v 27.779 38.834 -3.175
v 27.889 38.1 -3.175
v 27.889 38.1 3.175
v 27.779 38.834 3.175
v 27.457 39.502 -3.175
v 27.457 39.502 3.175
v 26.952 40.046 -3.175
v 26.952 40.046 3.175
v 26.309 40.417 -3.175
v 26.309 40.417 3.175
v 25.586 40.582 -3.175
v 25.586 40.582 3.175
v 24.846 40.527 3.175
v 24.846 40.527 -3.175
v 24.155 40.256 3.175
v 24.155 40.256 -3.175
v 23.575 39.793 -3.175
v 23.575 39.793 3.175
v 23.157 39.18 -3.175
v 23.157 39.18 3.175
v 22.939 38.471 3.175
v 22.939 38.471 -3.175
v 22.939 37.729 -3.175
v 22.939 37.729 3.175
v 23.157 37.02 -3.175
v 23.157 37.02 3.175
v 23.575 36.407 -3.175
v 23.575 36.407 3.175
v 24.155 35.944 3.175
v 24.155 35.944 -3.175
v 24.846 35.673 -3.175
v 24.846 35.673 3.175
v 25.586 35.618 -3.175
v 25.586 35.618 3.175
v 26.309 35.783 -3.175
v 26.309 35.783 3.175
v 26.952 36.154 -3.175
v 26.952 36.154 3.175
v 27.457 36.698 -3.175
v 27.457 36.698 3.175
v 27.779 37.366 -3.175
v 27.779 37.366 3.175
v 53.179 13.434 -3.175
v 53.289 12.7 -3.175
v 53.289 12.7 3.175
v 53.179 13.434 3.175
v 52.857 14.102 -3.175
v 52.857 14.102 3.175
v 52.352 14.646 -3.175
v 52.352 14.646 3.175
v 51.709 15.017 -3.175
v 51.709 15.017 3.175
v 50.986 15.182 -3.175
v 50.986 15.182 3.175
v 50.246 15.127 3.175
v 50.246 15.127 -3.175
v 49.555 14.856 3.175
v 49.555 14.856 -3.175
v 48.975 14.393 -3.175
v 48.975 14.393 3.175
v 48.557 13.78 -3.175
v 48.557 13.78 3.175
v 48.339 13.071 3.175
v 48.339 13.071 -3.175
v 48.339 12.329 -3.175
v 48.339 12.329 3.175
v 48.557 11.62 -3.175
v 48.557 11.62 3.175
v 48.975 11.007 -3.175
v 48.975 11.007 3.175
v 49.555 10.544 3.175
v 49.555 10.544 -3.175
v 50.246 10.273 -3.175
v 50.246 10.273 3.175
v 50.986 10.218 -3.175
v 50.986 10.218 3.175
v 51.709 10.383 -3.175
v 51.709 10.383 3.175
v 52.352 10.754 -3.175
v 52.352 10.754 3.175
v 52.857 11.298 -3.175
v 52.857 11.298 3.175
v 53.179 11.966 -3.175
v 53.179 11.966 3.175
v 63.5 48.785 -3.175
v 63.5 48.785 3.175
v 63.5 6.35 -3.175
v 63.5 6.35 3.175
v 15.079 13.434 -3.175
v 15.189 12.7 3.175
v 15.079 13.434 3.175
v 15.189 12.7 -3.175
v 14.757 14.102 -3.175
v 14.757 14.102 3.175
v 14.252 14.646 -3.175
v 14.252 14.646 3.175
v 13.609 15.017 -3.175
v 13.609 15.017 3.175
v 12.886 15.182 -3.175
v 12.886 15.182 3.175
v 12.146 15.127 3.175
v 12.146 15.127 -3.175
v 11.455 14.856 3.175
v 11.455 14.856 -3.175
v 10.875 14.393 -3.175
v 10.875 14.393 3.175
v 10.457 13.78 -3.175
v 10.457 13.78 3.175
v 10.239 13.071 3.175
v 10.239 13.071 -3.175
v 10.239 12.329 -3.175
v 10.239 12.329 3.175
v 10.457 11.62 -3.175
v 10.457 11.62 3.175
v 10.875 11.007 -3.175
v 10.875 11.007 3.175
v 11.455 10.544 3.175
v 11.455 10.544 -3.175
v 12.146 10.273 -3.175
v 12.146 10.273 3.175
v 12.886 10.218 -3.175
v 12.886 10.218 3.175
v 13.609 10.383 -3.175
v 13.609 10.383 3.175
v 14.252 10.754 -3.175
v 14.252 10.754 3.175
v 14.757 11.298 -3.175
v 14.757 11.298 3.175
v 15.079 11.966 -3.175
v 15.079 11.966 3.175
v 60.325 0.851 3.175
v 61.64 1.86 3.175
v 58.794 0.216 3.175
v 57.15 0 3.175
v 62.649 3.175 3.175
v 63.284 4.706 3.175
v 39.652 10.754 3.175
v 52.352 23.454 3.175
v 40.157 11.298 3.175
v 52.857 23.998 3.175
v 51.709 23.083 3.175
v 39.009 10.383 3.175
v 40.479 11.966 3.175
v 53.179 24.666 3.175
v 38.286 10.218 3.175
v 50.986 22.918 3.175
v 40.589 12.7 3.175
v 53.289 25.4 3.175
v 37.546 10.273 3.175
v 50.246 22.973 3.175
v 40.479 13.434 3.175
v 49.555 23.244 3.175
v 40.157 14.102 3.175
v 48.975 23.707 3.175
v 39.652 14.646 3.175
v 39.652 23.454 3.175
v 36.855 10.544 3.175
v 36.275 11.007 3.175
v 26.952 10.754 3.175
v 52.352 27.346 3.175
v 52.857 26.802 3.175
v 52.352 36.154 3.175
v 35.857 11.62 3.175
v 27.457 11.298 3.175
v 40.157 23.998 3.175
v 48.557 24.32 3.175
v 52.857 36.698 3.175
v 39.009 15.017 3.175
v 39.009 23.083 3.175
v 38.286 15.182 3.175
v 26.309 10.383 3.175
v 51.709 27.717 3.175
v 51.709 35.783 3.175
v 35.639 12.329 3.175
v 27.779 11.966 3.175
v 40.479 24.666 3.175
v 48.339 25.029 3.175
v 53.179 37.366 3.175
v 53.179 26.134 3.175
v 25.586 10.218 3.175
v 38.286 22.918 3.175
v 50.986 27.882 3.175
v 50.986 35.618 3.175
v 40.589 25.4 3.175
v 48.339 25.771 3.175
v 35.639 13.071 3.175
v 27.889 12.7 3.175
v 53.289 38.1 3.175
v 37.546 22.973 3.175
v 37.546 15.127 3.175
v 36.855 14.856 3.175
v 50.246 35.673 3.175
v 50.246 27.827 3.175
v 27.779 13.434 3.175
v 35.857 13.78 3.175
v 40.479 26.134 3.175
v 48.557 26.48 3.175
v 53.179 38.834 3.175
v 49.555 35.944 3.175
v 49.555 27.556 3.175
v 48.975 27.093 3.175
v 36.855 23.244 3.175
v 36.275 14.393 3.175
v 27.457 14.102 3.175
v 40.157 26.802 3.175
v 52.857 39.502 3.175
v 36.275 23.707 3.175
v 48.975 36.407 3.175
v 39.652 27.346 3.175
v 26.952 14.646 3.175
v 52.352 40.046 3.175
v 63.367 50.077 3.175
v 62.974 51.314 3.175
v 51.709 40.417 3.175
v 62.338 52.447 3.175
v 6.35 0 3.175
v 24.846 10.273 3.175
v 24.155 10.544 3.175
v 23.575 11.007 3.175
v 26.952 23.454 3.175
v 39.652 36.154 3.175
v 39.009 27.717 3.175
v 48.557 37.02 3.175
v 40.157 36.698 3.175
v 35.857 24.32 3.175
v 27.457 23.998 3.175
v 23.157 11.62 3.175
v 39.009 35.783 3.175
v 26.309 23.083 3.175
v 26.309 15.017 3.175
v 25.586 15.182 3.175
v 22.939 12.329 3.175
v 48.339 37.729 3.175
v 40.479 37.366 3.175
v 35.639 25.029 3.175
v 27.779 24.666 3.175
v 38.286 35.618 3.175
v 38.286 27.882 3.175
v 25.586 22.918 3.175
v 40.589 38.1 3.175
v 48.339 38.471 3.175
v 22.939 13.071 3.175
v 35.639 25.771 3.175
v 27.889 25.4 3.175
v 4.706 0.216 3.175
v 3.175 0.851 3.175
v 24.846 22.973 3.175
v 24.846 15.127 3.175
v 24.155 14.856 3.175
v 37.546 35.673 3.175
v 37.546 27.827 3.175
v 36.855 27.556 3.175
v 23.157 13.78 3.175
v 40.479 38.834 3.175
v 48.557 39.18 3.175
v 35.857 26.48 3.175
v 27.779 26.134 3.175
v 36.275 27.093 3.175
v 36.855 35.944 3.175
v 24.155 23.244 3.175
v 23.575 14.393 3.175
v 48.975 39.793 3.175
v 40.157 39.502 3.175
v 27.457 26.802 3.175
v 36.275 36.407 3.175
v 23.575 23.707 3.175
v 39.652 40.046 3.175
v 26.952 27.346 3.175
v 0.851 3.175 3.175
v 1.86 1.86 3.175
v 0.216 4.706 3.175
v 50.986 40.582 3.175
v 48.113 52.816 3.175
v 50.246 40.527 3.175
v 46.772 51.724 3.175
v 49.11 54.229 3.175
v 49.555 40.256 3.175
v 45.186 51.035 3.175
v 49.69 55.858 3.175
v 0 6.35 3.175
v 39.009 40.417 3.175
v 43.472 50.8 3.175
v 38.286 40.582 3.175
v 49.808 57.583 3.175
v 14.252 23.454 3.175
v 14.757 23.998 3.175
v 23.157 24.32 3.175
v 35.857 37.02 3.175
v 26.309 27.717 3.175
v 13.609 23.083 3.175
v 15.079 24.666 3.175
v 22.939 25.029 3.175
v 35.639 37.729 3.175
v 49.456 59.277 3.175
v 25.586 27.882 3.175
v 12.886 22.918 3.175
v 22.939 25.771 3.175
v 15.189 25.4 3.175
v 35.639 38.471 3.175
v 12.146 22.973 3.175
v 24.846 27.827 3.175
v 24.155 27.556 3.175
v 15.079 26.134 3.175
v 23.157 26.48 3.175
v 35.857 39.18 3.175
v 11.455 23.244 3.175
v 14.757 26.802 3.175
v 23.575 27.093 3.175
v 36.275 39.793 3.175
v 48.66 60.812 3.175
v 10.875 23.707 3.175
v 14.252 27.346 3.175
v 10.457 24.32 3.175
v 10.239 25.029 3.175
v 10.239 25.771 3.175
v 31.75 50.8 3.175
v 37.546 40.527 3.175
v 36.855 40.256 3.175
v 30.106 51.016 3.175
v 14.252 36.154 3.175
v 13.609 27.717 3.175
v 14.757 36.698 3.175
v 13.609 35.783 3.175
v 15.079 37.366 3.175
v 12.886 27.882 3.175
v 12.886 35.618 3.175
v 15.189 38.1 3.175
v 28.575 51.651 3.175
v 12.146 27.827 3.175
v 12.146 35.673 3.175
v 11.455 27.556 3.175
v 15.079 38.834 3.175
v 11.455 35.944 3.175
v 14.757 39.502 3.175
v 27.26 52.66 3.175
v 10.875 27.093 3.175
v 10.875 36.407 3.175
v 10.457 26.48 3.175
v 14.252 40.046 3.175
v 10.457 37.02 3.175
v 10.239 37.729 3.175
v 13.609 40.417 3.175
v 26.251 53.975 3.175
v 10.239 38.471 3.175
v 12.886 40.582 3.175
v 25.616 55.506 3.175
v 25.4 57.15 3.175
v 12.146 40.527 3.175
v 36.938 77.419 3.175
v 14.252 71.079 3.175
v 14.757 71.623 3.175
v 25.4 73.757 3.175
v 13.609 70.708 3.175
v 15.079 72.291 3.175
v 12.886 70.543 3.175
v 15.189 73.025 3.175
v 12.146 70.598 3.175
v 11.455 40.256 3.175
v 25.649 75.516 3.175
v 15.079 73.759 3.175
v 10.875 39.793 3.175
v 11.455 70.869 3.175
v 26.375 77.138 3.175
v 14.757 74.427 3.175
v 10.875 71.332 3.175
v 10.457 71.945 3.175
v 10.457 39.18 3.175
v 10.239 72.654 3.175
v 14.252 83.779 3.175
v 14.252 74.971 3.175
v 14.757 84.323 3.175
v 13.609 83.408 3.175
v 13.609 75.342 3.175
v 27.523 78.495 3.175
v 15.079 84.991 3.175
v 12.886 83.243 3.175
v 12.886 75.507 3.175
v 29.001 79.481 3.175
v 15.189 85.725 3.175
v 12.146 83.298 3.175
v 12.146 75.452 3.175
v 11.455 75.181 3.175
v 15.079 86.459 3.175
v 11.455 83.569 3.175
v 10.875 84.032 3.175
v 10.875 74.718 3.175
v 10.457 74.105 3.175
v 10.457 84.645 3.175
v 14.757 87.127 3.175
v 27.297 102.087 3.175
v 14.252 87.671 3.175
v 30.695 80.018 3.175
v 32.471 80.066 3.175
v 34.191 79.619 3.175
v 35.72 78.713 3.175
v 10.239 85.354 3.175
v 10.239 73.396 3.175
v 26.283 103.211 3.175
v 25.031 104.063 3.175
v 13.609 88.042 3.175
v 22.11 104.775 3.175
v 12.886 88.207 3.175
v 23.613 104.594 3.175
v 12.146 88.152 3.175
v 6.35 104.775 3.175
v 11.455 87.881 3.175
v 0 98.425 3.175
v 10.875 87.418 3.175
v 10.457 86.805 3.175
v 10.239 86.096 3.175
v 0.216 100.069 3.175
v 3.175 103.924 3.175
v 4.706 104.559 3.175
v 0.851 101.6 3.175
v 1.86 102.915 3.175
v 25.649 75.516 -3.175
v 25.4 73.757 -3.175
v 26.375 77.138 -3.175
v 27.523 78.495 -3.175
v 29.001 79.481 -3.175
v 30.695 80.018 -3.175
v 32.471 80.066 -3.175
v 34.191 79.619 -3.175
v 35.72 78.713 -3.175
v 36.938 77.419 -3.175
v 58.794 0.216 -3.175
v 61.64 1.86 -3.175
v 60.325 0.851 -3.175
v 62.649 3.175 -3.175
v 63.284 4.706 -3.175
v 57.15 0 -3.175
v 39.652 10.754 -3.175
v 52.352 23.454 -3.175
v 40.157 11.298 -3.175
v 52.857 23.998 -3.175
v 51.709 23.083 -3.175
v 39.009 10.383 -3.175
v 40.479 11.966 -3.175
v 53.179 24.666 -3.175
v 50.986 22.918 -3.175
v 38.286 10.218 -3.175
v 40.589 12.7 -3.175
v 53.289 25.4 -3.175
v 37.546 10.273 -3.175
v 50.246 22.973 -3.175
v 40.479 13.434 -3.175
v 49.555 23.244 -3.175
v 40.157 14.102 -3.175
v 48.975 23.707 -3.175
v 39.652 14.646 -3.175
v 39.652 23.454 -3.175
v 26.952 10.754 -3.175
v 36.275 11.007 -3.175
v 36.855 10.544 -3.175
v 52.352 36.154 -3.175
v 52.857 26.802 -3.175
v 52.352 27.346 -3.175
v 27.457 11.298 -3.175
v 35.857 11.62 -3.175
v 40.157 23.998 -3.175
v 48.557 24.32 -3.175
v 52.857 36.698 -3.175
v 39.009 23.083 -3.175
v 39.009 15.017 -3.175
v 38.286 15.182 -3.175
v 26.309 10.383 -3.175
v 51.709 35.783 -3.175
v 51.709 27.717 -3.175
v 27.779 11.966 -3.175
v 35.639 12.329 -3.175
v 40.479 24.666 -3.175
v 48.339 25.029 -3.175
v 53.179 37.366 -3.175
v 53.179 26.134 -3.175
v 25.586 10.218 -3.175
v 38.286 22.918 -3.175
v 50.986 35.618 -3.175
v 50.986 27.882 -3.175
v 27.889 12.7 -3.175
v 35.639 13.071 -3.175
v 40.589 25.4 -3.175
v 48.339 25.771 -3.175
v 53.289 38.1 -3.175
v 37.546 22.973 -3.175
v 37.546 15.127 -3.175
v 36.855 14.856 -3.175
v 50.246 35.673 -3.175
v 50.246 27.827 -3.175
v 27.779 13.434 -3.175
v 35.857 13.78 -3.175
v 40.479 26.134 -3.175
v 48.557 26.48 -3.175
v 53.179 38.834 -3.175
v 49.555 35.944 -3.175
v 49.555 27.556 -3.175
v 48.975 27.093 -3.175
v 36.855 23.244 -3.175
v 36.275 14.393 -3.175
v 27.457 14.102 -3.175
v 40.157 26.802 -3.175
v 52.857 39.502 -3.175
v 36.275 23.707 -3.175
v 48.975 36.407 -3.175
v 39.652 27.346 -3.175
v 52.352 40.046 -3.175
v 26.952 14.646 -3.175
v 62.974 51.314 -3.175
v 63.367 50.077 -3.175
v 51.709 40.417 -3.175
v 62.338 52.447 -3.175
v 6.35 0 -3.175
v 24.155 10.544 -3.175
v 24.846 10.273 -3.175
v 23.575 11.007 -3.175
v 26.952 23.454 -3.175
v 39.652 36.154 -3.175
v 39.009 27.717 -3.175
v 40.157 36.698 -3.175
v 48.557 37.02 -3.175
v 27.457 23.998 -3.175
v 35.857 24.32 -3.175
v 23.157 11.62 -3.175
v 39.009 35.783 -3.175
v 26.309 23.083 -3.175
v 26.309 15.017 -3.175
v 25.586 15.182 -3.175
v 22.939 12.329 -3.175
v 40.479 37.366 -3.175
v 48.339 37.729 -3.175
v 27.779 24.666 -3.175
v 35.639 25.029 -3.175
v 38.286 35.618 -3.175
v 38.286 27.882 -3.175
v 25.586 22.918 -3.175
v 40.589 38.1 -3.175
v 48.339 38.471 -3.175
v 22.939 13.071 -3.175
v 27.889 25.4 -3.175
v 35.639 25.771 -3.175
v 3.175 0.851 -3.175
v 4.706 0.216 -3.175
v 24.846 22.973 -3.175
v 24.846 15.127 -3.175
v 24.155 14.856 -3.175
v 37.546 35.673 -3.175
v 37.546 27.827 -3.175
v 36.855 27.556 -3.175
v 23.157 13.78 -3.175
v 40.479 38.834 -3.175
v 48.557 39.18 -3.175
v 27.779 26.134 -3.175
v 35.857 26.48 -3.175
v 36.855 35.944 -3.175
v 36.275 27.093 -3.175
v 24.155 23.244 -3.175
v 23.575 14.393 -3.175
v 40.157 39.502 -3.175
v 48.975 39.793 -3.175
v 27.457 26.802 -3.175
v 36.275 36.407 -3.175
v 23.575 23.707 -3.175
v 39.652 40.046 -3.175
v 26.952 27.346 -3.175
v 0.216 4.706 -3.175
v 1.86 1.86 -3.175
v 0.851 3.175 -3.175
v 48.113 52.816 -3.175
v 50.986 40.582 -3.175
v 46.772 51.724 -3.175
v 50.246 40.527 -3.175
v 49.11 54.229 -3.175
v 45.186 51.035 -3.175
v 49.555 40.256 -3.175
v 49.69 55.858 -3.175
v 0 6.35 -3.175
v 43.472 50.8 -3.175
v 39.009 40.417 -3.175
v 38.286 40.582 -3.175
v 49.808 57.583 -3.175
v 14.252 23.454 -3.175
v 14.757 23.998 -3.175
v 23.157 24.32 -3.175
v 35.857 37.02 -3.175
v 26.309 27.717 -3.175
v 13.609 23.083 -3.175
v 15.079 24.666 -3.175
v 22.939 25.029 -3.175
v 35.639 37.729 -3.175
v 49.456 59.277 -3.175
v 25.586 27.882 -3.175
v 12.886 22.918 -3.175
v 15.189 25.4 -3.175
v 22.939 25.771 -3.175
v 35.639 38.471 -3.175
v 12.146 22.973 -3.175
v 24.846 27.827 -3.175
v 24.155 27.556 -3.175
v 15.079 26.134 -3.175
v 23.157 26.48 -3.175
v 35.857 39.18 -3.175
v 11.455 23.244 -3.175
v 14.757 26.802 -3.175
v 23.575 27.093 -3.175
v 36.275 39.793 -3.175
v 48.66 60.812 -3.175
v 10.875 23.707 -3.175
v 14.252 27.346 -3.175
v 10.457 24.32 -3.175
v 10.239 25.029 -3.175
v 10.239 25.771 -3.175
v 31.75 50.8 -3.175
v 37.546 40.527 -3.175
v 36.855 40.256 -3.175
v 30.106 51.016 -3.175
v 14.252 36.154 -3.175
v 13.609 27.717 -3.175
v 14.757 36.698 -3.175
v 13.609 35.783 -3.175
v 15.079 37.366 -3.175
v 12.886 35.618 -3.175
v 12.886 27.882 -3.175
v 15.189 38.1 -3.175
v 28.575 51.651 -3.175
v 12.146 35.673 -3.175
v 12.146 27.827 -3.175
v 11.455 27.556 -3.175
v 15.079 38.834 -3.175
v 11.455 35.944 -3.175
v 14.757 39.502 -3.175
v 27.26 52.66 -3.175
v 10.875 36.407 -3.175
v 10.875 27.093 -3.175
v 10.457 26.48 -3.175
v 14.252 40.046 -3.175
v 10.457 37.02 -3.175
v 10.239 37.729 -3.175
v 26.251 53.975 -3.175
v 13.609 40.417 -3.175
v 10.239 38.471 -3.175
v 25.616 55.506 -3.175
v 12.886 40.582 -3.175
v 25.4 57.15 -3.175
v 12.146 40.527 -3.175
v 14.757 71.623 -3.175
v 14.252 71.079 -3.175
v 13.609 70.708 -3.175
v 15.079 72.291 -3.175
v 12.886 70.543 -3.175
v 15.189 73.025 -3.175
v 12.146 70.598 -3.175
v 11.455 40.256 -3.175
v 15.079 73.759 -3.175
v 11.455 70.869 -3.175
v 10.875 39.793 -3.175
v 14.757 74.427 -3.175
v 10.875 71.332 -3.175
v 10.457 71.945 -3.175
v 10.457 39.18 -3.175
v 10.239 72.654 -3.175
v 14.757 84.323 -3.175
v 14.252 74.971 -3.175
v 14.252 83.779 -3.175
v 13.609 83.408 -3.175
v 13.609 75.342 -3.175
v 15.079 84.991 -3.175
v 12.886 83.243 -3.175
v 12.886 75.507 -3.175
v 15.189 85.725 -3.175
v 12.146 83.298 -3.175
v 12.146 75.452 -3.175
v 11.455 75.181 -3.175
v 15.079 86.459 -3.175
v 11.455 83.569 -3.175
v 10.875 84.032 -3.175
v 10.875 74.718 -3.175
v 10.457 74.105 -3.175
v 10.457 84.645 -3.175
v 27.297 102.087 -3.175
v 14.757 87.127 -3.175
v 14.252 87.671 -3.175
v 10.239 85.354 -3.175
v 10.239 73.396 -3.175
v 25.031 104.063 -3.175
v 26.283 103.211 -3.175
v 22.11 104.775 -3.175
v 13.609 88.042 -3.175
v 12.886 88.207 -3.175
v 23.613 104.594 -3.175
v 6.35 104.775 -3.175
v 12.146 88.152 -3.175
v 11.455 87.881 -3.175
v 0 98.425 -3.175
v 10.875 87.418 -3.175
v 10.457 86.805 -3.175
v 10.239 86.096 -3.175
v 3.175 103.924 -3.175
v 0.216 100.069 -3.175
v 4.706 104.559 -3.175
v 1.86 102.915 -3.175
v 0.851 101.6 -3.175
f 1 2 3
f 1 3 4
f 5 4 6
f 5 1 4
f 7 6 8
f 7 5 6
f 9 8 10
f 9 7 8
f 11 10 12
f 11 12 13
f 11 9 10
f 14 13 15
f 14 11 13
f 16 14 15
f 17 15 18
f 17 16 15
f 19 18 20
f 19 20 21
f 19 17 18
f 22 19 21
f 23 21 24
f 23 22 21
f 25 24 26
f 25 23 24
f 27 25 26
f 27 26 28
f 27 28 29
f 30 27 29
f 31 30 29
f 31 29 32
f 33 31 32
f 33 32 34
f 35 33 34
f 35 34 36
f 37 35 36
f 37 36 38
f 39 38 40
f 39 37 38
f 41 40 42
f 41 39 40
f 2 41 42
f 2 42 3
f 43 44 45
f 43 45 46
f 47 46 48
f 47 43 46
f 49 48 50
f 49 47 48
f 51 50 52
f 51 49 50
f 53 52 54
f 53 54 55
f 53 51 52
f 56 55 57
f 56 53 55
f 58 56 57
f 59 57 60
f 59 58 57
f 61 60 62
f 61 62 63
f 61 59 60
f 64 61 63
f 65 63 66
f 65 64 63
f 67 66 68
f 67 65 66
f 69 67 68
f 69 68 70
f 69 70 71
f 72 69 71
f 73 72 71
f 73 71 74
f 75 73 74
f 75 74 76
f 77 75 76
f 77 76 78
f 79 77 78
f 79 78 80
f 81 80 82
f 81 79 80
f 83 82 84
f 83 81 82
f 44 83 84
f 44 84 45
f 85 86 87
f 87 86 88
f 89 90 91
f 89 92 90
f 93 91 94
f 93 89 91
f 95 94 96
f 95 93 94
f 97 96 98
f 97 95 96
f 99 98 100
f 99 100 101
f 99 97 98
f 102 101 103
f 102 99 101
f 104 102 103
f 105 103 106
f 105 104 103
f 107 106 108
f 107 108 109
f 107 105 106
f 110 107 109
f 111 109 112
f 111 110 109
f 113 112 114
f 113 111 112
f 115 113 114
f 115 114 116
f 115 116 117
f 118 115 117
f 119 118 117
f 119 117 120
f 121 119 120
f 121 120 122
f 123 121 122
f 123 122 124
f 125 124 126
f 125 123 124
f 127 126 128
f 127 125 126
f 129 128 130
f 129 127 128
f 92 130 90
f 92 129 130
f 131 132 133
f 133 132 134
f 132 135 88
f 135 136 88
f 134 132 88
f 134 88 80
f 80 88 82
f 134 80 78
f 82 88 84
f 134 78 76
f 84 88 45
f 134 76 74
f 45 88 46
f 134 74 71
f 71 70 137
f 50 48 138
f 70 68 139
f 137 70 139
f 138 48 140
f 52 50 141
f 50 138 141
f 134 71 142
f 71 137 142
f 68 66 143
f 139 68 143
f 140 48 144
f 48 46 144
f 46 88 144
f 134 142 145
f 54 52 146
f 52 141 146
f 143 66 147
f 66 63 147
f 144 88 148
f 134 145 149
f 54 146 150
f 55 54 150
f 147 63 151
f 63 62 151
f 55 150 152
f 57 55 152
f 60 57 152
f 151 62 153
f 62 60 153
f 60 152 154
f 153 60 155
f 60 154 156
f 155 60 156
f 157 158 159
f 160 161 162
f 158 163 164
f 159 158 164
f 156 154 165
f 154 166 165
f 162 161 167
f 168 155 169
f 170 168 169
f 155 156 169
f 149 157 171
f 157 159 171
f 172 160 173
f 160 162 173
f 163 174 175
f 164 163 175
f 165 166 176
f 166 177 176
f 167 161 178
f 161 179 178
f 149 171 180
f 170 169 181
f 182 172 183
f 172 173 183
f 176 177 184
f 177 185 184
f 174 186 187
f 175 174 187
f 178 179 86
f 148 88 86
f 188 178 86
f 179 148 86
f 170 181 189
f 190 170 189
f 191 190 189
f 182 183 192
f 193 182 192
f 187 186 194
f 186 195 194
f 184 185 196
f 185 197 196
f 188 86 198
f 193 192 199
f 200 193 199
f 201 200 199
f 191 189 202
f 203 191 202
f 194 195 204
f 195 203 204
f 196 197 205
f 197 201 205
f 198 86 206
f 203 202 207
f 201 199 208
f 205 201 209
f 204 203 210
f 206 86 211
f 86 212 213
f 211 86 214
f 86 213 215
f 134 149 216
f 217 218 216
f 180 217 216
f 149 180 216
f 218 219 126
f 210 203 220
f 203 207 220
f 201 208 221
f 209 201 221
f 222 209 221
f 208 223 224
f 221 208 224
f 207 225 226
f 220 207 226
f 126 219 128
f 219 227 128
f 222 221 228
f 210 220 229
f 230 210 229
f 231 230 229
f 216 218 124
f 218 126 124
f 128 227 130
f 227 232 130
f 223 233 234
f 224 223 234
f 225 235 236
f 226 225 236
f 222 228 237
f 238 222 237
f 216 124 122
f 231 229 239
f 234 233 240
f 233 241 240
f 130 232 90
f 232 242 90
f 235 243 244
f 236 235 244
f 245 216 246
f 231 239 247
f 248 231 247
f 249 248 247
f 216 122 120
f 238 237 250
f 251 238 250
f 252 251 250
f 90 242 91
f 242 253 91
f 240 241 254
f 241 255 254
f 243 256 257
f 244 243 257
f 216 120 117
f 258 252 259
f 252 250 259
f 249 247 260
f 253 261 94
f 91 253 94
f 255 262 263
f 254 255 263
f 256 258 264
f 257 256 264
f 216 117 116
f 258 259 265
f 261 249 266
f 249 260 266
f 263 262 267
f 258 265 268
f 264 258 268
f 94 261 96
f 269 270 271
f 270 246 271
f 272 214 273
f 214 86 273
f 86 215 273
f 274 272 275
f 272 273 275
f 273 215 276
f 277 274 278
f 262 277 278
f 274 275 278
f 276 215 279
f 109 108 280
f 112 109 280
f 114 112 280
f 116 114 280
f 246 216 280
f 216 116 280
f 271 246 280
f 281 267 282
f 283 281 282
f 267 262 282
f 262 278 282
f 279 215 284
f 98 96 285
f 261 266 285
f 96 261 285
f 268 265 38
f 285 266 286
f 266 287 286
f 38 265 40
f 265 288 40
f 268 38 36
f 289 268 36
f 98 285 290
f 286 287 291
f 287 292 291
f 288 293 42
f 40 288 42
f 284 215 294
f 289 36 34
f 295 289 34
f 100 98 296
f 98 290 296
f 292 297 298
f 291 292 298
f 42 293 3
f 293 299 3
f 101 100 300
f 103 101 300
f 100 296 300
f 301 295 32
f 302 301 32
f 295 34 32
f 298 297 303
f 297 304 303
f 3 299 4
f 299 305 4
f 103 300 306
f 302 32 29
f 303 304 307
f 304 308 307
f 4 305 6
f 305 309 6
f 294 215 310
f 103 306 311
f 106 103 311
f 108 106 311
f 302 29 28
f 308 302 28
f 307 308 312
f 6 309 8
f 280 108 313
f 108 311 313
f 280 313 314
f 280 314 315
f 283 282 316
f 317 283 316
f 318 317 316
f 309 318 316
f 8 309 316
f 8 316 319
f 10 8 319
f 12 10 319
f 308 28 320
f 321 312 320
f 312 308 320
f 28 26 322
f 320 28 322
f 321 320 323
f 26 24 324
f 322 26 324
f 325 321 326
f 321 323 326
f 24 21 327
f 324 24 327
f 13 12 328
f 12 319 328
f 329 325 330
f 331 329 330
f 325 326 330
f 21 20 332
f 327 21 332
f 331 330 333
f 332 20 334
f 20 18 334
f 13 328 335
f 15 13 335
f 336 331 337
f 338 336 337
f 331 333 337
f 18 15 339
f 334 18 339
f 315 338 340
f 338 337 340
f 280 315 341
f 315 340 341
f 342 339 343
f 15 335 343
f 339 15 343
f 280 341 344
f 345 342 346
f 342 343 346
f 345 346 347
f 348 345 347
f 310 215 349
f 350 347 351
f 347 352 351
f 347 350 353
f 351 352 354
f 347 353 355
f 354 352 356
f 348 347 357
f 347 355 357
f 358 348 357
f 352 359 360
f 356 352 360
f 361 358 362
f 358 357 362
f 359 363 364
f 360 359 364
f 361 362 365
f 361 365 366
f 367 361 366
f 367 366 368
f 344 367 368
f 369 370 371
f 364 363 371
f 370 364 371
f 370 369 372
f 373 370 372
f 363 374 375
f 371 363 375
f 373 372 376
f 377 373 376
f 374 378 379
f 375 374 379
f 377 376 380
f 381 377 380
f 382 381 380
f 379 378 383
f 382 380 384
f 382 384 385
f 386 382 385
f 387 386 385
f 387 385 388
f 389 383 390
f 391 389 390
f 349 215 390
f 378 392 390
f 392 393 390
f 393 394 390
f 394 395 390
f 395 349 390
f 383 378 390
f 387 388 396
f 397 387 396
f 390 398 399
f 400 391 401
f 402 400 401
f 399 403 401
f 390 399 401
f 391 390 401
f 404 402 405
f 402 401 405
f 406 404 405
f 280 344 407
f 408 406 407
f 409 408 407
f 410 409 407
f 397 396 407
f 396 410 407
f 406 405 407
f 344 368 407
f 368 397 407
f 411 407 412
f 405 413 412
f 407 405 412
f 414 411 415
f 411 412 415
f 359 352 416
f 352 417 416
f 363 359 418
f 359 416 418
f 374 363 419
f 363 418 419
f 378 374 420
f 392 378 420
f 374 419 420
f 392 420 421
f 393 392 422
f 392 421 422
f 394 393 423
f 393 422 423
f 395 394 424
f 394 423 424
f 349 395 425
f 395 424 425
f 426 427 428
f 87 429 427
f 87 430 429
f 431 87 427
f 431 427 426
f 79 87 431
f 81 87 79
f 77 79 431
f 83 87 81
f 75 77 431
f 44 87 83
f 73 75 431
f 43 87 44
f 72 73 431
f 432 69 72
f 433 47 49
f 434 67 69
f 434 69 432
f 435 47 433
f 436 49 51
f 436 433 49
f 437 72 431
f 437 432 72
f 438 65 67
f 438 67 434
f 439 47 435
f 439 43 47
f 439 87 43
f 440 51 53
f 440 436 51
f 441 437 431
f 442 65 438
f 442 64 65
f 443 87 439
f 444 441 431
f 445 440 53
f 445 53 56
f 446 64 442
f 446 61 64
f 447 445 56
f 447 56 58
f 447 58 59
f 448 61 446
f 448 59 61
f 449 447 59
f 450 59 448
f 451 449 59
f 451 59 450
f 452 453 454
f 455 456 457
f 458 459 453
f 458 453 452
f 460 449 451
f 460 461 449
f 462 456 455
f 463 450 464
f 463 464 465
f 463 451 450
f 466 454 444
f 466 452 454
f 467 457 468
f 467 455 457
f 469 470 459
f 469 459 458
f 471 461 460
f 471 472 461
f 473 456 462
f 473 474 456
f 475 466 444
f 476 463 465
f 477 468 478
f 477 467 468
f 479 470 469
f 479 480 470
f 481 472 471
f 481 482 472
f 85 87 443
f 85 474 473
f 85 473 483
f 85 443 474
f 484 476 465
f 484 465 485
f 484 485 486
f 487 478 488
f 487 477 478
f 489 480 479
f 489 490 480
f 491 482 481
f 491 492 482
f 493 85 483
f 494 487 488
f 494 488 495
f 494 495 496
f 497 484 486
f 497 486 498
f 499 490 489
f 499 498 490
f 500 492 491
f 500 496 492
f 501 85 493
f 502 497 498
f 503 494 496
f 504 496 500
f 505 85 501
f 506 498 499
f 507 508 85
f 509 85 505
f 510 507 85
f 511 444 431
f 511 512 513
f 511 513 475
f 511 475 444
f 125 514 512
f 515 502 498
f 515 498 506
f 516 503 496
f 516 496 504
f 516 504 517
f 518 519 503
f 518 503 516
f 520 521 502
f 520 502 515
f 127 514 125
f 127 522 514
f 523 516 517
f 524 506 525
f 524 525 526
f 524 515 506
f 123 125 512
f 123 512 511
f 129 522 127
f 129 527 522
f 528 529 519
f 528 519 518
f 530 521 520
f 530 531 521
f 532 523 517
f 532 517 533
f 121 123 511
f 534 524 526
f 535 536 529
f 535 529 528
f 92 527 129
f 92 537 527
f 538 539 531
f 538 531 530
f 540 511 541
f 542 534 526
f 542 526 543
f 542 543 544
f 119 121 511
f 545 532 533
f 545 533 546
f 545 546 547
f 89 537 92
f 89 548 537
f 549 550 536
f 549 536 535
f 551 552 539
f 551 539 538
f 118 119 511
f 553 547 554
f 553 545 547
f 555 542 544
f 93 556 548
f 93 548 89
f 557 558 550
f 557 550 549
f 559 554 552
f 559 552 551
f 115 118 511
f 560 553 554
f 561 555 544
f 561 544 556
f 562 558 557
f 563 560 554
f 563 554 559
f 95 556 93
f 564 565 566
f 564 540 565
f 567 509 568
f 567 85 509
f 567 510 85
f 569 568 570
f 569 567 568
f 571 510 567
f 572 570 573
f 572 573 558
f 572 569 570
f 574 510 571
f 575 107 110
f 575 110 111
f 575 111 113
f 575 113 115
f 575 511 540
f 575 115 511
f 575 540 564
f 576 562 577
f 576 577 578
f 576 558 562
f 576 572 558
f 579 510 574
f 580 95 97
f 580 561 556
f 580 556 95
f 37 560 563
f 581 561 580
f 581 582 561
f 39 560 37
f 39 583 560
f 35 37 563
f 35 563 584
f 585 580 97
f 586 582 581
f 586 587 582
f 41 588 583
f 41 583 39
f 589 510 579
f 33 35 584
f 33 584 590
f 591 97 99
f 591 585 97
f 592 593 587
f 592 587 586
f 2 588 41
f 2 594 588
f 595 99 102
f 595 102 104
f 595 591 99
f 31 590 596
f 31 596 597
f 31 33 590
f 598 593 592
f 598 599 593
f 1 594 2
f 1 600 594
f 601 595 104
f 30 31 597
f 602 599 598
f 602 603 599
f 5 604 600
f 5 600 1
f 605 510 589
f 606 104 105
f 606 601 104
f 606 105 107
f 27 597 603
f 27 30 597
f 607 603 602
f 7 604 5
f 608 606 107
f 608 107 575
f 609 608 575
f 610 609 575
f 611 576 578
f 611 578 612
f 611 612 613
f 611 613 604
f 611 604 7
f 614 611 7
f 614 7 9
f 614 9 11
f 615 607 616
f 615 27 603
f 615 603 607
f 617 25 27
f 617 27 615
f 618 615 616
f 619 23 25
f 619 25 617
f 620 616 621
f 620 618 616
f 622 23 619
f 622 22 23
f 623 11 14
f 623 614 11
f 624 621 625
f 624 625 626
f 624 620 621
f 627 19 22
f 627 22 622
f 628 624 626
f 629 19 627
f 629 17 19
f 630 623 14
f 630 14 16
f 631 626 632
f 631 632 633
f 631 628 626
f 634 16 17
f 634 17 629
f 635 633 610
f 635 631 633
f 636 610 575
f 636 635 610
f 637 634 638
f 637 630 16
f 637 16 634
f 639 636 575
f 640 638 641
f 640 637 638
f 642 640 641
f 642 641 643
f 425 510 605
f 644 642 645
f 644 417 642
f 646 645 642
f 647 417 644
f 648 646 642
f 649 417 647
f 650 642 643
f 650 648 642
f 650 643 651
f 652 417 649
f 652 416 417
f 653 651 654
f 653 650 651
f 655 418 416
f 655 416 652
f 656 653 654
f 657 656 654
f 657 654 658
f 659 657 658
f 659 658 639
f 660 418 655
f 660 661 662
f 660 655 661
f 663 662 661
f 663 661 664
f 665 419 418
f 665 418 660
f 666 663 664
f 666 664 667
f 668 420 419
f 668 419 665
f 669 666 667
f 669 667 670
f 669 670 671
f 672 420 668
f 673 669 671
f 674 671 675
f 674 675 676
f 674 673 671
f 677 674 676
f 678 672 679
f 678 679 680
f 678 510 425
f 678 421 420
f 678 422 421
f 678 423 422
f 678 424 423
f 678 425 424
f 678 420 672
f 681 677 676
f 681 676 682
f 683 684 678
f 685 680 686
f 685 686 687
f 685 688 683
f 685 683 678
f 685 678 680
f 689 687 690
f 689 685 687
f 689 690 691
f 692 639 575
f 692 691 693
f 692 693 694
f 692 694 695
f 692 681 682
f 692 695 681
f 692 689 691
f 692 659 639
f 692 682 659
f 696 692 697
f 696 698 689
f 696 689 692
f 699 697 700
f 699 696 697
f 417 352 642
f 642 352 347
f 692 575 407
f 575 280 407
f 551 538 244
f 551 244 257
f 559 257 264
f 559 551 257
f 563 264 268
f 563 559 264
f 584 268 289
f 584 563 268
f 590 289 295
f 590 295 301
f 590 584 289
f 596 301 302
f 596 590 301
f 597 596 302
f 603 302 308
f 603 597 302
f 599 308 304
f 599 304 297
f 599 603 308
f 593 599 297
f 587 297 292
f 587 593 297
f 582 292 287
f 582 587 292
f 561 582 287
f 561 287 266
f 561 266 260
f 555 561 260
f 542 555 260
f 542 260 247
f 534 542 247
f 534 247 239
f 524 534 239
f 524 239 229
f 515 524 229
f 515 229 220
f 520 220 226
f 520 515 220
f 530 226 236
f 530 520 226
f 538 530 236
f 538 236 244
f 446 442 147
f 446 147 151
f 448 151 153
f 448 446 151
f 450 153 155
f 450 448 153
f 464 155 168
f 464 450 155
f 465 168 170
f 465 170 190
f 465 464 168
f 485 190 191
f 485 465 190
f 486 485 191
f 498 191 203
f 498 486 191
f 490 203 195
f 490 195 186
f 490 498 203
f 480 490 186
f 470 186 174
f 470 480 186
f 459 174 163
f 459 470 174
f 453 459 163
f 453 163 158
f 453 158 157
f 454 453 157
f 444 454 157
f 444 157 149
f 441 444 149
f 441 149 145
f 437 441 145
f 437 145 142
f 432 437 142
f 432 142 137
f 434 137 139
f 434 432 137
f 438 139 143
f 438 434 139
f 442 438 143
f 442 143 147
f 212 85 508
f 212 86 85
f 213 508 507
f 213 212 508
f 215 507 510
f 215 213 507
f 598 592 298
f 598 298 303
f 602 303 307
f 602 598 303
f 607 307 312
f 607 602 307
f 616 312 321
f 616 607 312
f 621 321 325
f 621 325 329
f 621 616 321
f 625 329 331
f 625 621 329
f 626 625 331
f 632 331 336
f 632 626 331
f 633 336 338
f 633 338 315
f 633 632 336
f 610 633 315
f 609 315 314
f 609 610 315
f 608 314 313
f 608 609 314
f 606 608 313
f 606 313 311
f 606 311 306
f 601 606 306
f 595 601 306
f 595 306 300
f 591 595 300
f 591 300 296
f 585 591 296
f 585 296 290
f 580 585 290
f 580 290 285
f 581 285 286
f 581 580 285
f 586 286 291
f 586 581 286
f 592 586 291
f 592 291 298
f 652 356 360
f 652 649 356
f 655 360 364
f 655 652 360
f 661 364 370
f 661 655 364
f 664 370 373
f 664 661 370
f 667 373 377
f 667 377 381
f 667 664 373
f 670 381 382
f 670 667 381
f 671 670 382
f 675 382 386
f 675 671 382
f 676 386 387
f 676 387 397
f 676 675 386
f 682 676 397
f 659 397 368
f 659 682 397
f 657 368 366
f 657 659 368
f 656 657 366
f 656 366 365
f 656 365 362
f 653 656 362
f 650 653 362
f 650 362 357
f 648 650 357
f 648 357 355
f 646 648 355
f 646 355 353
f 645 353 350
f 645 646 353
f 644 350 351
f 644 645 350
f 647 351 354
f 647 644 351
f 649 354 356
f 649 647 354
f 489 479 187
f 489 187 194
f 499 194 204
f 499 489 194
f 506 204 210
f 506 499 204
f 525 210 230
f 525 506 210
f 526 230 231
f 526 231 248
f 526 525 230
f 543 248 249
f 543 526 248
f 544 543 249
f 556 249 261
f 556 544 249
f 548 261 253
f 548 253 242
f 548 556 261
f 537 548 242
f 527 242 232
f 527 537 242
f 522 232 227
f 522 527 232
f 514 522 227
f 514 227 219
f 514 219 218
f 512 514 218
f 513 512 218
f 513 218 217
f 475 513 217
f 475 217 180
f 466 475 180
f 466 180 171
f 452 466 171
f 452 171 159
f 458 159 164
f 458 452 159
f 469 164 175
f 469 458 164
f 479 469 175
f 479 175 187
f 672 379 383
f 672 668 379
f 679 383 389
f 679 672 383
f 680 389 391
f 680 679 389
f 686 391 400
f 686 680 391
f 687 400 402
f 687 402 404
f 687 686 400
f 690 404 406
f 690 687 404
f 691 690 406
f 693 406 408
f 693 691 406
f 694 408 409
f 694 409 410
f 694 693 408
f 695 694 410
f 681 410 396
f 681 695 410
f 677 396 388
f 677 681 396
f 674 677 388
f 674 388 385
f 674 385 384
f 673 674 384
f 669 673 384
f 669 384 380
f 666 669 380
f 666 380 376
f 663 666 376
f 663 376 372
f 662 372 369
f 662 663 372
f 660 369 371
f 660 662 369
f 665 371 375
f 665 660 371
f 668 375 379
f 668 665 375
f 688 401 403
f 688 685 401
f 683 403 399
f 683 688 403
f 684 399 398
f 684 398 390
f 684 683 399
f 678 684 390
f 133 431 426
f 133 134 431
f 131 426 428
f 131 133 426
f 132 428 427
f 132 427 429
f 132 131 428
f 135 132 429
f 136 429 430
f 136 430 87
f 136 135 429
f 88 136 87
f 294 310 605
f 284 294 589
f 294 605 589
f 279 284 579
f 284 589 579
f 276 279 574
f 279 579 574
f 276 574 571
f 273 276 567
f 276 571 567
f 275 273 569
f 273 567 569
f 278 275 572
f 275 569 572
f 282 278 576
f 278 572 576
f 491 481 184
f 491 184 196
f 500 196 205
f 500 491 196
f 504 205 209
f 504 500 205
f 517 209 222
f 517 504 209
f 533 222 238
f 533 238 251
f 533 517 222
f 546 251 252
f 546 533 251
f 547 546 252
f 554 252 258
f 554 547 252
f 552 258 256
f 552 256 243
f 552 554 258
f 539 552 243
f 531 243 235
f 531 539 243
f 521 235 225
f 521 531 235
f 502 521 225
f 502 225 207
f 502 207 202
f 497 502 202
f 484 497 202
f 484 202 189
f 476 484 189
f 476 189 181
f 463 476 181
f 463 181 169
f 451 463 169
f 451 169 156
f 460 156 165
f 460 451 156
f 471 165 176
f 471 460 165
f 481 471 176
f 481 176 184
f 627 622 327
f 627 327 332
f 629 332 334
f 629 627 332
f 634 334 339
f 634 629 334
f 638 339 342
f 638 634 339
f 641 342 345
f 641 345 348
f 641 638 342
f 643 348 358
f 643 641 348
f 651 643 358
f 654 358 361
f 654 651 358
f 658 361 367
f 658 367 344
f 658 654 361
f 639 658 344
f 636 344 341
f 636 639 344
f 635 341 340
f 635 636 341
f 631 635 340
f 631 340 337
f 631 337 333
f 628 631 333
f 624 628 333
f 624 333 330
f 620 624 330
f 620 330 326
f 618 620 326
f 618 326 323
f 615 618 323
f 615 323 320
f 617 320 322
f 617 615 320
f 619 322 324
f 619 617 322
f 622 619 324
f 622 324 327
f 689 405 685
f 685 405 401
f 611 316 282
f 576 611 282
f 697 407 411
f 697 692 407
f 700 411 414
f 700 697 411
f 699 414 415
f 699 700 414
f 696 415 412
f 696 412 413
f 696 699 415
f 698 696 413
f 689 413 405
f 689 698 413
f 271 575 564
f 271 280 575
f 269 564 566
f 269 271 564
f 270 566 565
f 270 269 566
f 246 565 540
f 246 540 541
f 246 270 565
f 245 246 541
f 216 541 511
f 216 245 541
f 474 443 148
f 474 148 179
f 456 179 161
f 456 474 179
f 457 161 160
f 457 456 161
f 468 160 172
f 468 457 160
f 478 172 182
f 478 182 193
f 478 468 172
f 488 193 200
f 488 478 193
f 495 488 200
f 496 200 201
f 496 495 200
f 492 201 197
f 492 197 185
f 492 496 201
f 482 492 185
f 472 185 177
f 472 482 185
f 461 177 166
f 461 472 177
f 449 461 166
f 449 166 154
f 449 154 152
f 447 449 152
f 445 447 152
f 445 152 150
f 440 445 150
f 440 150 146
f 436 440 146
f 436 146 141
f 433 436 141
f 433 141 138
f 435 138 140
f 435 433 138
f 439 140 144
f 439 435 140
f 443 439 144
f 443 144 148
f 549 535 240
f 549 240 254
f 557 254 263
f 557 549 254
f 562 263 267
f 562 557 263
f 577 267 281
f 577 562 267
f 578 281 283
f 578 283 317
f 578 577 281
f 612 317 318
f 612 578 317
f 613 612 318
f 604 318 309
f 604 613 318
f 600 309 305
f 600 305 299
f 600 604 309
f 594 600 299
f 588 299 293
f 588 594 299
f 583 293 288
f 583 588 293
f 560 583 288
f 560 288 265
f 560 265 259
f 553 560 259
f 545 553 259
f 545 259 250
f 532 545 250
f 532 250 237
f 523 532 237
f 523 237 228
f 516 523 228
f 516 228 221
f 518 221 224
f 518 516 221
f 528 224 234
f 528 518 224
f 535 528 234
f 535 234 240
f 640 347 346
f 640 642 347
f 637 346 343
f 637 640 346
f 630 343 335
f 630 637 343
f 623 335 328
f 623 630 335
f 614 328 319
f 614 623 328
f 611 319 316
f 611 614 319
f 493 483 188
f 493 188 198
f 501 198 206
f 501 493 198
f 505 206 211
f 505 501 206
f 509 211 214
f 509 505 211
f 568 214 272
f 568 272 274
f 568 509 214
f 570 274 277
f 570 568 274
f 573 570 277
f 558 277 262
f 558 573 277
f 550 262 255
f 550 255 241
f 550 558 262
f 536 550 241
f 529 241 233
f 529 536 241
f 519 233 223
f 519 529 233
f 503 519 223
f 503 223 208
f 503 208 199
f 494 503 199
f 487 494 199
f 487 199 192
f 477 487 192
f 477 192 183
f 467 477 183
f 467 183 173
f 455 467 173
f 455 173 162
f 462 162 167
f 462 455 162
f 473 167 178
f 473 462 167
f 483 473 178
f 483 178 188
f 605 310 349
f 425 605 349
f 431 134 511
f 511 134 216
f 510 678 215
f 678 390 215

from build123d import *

# Parameters (mm, degrees)
SKETCH1_R           = 2.4892
BOSS_EXTRUDE1_DEPTH = 3.175
LPATTERN1_START     = -3.175
LPATTERN1_OUTLINE_R = 2.4892
LPATTERN1_DEPTH     = 6.35
CUT_EXTRUDE1_DEPTH  = 123.679962198
FILLET1_R           = 6.35


# Read off the part's stored shape, not the designer's step: LPattern1
with BuildPart() as part:
    # Sketch1 → Boss-Extrude1 (new, symmetric)
    with BuildSketch(Plane.XY):
        Polygon((0, 0), (0, 104.775), (25.4, 104.775), (63.5, 50.8), (63.5, 0), align=None)
        with Locations((12.7, 85.725)):
            Circle(SKETCH1_R, mode=Mode.SUBTRACT)
        with Locations((12.7, 73.025)):
            Circle(SKETCH1_R, mode=Mode.SUBTRACT)
        with Locations((12.7, 12.7)):
            Circle(SKETCH1_R, mode=Mode.SUBTRACT)
    extrude(amount=BOSS_EXTRUDE1_DEPTH, both=True)

    # LPattern1 outline → LPattern1 (cut)
    with BuildSketch(Plane.XY.offset(LPATTERN1_START)):
        with Locations((50.8, 38.1)):
            Circle(LPATTERN1_OUTLINE_R)
        with Locations((38.1, 38.1)):
            Circle(LPATTERN1_OUTLINE_R)
        with Locations((25.4, 38.1)):
            Circle(LPATTERN1_OUTLINE_R)
        with Locations((12.7, 38.1)):
            Circle(LPATTERN1_OUTLINE_R)
        with Locations((50.8, 25.4)):
            Circle(LPATTERN1_OUTLINE_R)
        with Locations((38.1, 25.4)):
            Circle(LPATTERN1_OUTLINE_R)
        with Locations((25.4, 25.4)):
            Circle(LPATTERN1_OUTLINE_R)
        with Locations((12.7, 25.4)):
            Circle(LPATTERN1_OUTLINE_R)
        with Locations((50.8, 12.7)):
            Circle(LPATTERN1_OUTLINE_R)
        with Locations((38.1, 12.7)):
            Circle(LPATTERN1_OUTLINE_R)
        with Locations((25.4, 12.7)):
            Circle(LPATTERN1_OUTLINE_R)
    extrude(amount=LPATTERN1_DEPTH, mode=Mode.SUBTRACT)

    # Sketch2 → Cut-Extrude1 (cut, through all)
    with BuildSketch(Plane.XY.offset(3.175)):
        Polygon((25.4, 93.763754959), (25.4, 50.8), (55.727356441, 50.8), align=None)
    extrude(amount=-CUT_EXTRUDE1_DEPTH, mode=Mode.SUBTRACT)

    # Fillet1
    fillet1_edges = [part.edges().sort_by_distance(p)[0] for p in [
        (55.727356441, 50.8, 0),
        (25.4, 50.8, 0),
        (25.4, 93.763754959, 0),
        (0, 0, 0),
        (0, 104.775, 0),
        (25.4, 104.775, 0),
        (63.5, 50.8, 0),
        (63.5, 0, 0),
    ]]
    fillet(fillet1_edges, radius=FILLET1_R)


solid = part.part
